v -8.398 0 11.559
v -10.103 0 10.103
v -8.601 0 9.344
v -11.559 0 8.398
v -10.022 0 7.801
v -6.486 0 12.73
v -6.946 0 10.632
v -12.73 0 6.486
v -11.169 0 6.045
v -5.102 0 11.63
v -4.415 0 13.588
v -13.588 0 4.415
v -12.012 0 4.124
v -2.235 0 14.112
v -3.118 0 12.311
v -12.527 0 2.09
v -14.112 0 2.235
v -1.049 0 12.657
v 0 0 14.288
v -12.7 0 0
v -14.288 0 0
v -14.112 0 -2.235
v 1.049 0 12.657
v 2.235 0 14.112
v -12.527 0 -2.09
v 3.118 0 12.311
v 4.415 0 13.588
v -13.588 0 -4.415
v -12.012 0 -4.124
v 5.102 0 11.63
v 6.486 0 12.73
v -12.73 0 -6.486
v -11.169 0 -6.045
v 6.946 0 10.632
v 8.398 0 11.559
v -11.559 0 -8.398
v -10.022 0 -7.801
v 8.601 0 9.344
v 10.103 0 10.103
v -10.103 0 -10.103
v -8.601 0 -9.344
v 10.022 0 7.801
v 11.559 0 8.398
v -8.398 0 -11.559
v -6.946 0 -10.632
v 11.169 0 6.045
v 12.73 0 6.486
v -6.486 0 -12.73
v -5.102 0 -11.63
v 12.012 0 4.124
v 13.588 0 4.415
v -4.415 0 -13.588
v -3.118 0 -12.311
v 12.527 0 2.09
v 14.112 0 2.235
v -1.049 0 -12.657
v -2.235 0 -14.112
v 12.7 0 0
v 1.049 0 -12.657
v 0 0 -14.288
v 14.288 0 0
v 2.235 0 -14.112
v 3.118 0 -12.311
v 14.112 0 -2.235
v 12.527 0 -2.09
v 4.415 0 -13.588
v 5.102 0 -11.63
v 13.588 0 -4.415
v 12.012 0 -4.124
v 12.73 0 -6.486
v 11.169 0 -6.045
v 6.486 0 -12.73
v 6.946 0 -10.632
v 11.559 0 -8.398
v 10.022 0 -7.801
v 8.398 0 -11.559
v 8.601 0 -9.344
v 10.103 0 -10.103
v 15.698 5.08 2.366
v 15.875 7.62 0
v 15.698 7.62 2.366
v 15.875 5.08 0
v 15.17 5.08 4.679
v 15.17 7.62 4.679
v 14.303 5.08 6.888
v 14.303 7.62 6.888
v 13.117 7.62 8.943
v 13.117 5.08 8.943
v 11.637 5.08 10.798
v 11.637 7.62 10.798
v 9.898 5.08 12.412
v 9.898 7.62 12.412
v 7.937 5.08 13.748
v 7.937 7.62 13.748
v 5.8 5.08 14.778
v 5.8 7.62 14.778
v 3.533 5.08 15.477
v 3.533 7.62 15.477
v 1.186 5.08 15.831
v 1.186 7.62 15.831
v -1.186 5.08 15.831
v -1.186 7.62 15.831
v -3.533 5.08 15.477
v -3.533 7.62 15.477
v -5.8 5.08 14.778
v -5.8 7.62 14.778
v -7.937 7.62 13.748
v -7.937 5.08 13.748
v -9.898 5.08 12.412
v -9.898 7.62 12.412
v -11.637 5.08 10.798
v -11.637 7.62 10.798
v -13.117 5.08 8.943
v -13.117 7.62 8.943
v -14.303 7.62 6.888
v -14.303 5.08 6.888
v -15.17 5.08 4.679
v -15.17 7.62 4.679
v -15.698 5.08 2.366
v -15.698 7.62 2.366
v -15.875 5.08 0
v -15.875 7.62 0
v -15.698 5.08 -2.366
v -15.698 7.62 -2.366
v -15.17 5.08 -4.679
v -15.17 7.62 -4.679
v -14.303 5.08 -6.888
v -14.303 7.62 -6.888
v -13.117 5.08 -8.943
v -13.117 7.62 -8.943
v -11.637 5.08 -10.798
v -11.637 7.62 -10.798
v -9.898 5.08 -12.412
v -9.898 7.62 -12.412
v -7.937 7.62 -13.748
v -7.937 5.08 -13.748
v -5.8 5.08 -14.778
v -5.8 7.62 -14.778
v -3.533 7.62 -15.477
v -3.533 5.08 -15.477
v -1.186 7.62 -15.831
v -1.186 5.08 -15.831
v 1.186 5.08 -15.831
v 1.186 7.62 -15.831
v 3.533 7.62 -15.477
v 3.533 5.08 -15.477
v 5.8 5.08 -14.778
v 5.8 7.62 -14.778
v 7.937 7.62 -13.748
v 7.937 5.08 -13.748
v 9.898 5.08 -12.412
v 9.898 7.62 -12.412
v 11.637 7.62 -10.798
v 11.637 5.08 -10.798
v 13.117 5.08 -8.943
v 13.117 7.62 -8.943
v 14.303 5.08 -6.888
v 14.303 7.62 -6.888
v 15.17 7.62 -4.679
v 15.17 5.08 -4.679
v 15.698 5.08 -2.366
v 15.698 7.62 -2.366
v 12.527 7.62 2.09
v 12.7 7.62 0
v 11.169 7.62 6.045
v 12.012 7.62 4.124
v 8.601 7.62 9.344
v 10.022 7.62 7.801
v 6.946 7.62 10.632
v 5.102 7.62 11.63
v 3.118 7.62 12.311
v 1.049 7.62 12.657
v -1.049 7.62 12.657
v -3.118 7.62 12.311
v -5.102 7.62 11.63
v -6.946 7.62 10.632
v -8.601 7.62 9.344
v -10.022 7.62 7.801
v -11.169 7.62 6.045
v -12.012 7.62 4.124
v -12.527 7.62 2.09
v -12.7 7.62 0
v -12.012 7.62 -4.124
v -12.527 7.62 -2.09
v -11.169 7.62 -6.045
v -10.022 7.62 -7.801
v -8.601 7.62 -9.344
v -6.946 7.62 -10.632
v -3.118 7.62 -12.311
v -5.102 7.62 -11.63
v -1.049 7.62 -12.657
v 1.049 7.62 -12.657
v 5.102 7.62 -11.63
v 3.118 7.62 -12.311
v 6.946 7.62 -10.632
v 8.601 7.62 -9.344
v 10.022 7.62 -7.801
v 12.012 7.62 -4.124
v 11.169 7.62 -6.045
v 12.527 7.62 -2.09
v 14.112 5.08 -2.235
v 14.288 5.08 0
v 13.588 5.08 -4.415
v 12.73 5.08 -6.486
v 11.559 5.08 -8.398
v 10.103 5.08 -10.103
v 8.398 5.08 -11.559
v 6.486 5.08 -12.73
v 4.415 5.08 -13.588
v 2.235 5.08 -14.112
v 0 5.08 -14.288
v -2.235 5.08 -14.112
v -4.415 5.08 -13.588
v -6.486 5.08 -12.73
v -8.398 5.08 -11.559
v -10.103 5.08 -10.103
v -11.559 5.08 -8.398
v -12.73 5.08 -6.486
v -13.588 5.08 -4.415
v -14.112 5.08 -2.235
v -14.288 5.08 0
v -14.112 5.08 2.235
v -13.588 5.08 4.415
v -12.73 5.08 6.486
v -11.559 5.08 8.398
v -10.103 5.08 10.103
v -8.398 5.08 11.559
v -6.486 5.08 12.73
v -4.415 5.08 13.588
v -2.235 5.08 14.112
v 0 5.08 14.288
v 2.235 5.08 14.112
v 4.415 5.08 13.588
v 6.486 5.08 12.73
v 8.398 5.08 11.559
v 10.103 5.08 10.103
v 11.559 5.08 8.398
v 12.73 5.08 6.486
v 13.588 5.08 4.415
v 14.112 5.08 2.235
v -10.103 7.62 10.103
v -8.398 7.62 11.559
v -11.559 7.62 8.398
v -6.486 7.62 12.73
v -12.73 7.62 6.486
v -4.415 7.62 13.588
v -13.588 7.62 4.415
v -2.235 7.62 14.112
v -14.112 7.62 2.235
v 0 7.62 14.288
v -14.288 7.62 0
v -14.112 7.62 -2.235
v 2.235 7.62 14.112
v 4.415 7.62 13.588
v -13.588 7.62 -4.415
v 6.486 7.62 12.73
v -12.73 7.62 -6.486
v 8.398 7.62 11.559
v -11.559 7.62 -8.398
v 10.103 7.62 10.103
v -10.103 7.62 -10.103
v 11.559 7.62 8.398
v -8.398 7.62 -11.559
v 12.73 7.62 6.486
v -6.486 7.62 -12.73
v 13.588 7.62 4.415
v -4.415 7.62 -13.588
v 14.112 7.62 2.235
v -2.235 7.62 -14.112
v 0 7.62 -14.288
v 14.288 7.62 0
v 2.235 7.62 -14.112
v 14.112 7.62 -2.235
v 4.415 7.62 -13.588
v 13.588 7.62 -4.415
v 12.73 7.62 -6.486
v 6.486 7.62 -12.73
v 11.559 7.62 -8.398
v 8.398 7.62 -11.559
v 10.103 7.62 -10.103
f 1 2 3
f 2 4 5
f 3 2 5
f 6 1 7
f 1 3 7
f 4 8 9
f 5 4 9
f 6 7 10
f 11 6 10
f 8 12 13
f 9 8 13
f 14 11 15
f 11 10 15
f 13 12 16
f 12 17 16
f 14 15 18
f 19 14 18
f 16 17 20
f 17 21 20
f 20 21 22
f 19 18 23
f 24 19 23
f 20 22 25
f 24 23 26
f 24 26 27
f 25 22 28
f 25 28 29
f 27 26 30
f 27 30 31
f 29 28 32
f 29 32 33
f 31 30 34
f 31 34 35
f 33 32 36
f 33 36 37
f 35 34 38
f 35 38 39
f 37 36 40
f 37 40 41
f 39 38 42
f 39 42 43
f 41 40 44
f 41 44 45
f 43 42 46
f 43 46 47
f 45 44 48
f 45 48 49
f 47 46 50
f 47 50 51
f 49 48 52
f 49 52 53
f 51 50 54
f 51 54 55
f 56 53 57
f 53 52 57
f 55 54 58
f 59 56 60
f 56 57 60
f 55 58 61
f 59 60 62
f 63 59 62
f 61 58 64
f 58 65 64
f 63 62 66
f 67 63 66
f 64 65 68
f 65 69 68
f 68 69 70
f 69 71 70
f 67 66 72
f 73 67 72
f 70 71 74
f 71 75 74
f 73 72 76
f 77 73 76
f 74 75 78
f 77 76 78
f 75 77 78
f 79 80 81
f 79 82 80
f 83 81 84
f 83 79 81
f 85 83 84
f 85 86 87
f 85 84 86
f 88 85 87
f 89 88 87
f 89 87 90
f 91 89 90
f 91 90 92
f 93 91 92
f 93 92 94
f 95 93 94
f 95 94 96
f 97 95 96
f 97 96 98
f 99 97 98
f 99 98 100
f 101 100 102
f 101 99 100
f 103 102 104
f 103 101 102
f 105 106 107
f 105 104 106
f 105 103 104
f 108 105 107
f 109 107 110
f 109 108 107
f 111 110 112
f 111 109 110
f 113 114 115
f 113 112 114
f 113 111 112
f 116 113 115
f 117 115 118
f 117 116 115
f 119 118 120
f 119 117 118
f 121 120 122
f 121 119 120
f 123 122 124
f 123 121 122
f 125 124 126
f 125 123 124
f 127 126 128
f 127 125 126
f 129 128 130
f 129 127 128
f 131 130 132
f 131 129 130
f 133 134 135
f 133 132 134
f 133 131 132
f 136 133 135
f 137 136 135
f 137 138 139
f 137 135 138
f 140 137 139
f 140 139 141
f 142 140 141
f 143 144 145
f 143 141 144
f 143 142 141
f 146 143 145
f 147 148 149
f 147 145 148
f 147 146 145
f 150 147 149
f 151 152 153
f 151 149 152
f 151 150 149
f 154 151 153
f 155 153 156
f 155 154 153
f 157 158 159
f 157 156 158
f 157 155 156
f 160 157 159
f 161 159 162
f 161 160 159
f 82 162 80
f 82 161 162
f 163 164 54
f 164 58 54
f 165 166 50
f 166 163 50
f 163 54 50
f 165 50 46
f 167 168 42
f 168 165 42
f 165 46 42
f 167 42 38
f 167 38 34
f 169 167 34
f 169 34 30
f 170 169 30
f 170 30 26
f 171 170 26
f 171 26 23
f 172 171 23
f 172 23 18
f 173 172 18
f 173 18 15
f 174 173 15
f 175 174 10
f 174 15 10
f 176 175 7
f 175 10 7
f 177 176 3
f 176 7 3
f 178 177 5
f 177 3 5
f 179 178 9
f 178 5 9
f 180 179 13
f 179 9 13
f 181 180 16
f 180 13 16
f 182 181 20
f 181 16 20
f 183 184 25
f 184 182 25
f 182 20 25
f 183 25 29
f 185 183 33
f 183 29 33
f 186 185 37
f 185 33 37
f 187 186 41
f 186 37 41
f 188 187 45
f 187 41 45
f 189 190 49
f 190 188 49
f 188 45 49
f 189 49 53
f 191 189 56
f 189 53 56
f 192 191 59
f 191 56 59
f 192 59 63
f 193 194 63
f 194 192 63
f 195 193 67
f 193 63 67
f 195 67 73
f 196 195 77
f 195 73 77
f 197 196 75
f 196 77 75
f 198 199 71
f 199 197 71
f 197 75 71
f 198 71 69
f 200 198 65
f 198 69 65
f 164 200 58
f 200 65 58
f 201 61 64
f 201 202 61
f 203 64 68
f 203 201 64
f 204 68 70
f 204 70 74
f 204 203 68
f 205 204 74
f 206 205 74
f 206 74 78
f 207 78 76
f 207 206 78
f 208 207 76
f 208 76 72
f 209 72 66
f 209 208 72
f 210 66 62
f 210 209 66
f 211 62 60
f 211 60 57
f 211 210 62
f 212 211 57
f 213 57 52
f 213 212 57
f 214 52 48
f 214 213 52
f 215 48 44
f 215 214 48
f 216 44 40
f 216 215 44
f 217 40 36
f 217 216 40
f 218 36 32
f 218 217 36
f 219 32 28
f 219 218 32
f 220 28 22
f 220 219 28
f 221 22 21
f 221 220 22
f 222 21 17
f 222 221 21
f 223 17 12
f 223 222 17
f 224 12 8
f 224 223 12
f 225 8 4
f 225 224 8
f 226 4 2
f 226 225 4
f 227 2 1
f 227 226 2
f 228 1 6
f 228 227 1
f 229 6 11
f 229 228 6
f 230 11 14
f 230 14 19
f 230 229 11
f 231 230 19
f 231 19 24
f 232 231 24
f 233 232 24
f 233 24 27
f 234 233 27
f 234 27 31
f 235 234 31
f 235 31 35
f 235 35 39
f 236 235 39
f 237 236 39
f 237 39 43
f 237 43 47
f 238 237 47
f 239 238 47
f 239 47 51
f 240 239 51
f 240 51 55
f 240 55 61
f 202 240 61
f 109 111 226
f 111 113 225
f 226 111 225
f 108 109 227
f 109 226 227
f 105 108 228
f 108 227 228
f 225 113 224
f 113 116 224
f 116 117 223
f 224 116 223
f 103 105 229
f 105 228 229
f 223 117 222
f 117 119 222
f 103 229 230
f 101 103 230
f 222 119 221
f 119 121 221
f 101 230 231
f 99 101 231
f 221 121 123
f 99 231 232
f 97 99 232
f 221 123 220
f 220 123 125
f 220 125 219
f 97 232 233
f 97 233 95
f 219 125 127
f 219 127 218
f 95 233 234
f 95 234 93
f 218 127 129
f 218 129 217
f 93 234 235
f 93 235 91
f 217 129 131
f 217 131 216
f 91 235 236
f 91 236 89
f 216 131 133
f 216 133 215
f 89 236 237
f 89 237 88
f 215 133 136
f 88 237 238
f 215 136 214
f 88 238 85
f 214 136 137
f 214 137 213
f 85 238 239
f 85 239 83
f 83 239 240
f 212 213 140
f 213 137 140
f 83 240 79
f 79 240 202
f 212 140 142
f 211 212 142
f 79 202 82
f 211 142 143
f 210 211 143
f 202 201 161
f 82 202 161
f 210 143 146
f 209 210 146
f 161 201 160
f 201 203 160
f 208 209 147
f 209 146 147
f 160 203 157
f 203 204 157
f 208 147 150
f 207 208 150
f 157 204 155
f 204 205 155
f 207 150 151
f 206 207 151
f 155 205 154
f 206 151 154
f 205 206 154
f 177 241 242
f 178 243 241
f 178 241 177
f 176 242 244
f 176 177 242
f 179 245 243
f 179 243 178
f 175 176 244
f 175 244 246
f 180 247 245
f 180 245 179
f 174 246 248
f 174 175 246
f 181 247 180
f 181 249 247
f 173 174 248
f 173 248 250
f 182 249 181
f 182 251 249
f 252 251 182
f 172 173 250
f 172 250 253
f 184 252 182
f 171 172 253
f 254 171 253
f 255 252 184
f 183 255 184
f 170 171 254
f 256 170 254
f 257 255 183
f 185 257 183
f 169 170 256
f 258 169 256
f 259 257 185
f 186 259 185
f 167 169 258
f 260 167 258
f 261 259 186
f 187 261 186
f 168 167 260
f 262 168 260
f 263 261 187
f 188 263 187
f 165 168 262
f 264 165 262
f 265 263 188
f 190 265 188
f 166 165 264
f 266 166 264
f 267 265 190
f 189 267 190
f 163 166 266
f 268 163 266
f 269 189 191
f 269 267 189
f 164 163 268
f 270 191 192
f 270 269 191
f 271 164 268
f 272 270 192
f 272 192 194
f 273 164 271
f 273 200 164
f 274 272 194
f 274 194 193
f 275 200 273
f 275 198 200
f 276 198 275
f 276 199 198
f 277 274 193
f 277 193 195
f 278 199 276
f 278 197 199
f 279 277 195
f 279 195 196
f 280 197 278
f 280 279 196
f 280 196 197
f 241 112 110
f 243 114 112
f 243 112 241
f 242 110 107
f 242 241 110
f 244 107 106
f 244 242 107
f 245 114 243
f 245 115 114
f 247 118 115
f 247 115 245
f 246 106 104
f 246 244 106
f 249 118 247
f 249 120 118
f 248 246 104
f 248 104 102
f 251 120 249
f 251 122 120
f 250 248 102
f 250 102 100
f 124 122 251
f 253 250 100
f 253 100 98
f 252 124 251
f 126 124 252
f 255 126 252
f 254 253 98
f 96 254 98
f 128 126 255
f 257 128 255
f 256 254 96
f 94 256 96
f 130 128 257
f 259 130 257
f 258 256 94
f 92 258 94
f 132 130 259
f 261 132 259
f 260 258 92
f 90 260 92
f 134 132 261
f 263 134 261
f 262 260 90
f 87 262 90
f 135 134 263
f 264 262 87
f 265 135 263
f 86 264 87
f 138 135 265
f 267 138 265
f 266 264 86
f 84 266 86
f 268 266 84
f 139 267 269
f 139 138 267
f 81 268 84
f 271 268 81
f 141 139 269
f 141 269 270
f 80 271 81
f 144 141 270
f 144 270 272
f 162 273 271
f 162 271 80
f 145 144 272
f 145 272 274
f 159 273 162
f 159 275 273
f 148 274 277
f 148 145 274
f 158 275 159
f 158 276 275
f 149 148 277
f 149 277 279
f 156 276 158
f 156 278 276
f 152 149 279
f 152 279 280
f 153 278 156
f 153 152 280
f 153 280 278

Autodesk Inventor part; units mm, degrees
ref_plane "YZ Plane" through (0, 0, 0) normal (1, 0, 0) x (0, 1, 0)
ref_plane "XZ Plane" through (0, 0, 0) normal (0, 1, 0) x (-1, 0, 0)
ref_plane "XY Plane" through (0, 0, 0) normal (0, 0, 1) x (1, 0, 0)
sketch "Sketch1" plane through (0, 0, 0) normal (0, 0, 1) x (1, 0, 0)
  line L0 (14.2875, 0) -> (14.2875, 5.08)
  line L1 (14.2875, 5.08) -> (15.875, 5.08)
  line L2 (12.7, 7.62) -> (12.7, 0)
  line L3 (12.7, 0) -> (14.2875, 0)
  line L4 (0, -2.54) -> (0, 15.24) projected
  line L5 (14.2875, 12.7) -> (14.2875, 7.62)
  line L6 (14.2875, 7.62) -> (15.875, 7.62)
  line L7 (15.875, 7.62) -> (15.875, 5.08)
  line L8 (15.875, 7.62) -> (15.875, 12.7)
  line L9 (15.875, 12.7) -> (14.2875, 12.7)
  line L10 (12.7, 7.62) -> (14.2875, 7.62)
  point P0 (0, 0)
  dimension "d1" = 14.2875
  dimension "d2" = 12.7
  dimension "d3" = 5.08
revolve "Revolution1" add sketch "Sketch1" angle 360 about axis through (0, -10, 0) along (0, 1, 0) contours L3 L2 L10 L6 L7 L1 L0
thread "Thread4" size "1-8 UNC" class "2B" standard "ANSI Unified Screw Threads" full length
sketch "Sketch5" plane through (0, 0, 0) normal (1, 0, 0) x (0, 1, 0)
  line L0 (-0.3529, -13.8698) -> (-0.3025, -13.8698) construction
  line L1 (0.0503, -14.2571) -> (-0.0001, -14.3539) construction
  line L2 (-0.6049, -14.3539) -> (-0.6553, -14.2571) construction
  line L3 (-0.2521, -13.8698) -> (-0.3025, -13.773) construction
  line L4 (-0.3025, -13.773) -> (-0.3529, -13.8698) construction
  line L5 (-0.6049, -14.3539) -> (-0.5545, -14.2571) construction
  line L6 (-0.2521, -13.8698) -> (-0.0505, -14.2571)
  line L7 (-0.6553, -14.2571) -> (-0.5545, -14.2571) construction
  arc A0 (-0.6553, -14.2571) -> (-0.6049, -14.2877) centre (-0.6049, -14.2309) ccw construction
  line L8 (0.0503, -14.2571) -> (-0.0505, -14.2571) construction
  line L9 (-0.6049, -14.3539) -> (-0.6049, -14.2571) construction
  line L10 (-0.0001, -14.3539) -> (-0.0001, -14.2571) construction
  line L11 (-0.3025, -13.773) -> (-0.3025, -13.8393) construction
  line L12 (-0.6049, -14.2877) -> (-0.0001, -14.2877)
  arc A1 (-0.6049, -14.2877) -> (-0.5545, -14.2571) centre (-0.6049, -14.2309) ccw
  line L13 (-0.0505, -14.2571) -> (-0.0001, -14.3539) construction
  line L14 (-0.5545, -14.2571) -> (-0.3529, -13.8698)
  line L15 (-0.0001, -0.0002) -> (-0.0001, 0.0177)
  line L16 (-0.0001, 0.0177) -> (-0.0001, -0.0002)
  line L17 (-0.0001, -0.0002) -> (0.0334, -0.0002)
  arc A2 (-0.0505, -14.2571) -> (-0.0001, -14.2877) centre (-0.0001, -14.2309) ccw
  arc A3 (-0.0001, -14.2877) -> (0.0503, -14.2571) centre (-0.0001, -14.2309) ccw construction
  arc A4 (-0.3025, -13.8393) -> (-0.3529, -13.8698) centre (-0.3025, -13.8961) ccw
  arc A5 (-0.2521, -13.8698) -> (-0.3025, -13.8393) centre (-0.3025, -13.8961) ccw
  line L18 (-0.3025, -13.8393) -> (-0.3025, -13.8698) construction
  line L19 (-0.3025, -13.8698) -> (-0.2521, -13.8698) construction
  dimension "d31" = 55
  dimension "d32" = 0.0968
  dimension "d33" = 0.0968
  dimension "Sketch5_ThreadOffset" = 0
  dimension "Sketch5_MajorRadius" = 14.2875
  dimension "d36" = 0.6048
  dimension "Sketch5_MinorRadius" = 13.8391
sketch "Sketch6" plane through (0, 0, 0) normal (-1, 0, 0) x (0, 0, 1)
  line L0 (14.2875, 0) -> (14.2875, 5.08)
  line L1 (14.2875, 5.08) -> (13.8391, 5.08)
  line L2 (13.8391, 5.08) -> (13.8391, 0)
  line L3 (13.8391, 0) -> (14.2875, 0)
  line L4 (0, -1.016) -> (0, 6.096) projected
sketch "Sketch7" plane through (0, 0, 0) normal (-1, 0, 0) x (0, 0, 1)
  line L0 (14.2875, 0) -> (14.2875, 5.08)
  line L1 (14.2875, 5.08) -> (13.8391, 5.08)
  line L2 (13.8391, 5.08) -> (13.8391, 0)
  line L3 (13.8391, 0) -> (14.2875, 0)
  line L4 (0, -1.016) -> (0, 6.096) projected
equation "\"d31\" = d38"
equation "\"d32\" = 0.160083 * Sketch5_Pitch"
equation "\"d33\" = 0.160083 * Sketch5_Pitch"
equation "\"d36\" = Sketch5_Pitch"
equation "\"d15\" = 55deg"
equation "\"Sketch2_Pitch\" = 0.90714"
equation "\"d38\" = 55deg"
equation "\"Sketch5_Pitch\" = 0.60476"
properties part number "202-experiment"
